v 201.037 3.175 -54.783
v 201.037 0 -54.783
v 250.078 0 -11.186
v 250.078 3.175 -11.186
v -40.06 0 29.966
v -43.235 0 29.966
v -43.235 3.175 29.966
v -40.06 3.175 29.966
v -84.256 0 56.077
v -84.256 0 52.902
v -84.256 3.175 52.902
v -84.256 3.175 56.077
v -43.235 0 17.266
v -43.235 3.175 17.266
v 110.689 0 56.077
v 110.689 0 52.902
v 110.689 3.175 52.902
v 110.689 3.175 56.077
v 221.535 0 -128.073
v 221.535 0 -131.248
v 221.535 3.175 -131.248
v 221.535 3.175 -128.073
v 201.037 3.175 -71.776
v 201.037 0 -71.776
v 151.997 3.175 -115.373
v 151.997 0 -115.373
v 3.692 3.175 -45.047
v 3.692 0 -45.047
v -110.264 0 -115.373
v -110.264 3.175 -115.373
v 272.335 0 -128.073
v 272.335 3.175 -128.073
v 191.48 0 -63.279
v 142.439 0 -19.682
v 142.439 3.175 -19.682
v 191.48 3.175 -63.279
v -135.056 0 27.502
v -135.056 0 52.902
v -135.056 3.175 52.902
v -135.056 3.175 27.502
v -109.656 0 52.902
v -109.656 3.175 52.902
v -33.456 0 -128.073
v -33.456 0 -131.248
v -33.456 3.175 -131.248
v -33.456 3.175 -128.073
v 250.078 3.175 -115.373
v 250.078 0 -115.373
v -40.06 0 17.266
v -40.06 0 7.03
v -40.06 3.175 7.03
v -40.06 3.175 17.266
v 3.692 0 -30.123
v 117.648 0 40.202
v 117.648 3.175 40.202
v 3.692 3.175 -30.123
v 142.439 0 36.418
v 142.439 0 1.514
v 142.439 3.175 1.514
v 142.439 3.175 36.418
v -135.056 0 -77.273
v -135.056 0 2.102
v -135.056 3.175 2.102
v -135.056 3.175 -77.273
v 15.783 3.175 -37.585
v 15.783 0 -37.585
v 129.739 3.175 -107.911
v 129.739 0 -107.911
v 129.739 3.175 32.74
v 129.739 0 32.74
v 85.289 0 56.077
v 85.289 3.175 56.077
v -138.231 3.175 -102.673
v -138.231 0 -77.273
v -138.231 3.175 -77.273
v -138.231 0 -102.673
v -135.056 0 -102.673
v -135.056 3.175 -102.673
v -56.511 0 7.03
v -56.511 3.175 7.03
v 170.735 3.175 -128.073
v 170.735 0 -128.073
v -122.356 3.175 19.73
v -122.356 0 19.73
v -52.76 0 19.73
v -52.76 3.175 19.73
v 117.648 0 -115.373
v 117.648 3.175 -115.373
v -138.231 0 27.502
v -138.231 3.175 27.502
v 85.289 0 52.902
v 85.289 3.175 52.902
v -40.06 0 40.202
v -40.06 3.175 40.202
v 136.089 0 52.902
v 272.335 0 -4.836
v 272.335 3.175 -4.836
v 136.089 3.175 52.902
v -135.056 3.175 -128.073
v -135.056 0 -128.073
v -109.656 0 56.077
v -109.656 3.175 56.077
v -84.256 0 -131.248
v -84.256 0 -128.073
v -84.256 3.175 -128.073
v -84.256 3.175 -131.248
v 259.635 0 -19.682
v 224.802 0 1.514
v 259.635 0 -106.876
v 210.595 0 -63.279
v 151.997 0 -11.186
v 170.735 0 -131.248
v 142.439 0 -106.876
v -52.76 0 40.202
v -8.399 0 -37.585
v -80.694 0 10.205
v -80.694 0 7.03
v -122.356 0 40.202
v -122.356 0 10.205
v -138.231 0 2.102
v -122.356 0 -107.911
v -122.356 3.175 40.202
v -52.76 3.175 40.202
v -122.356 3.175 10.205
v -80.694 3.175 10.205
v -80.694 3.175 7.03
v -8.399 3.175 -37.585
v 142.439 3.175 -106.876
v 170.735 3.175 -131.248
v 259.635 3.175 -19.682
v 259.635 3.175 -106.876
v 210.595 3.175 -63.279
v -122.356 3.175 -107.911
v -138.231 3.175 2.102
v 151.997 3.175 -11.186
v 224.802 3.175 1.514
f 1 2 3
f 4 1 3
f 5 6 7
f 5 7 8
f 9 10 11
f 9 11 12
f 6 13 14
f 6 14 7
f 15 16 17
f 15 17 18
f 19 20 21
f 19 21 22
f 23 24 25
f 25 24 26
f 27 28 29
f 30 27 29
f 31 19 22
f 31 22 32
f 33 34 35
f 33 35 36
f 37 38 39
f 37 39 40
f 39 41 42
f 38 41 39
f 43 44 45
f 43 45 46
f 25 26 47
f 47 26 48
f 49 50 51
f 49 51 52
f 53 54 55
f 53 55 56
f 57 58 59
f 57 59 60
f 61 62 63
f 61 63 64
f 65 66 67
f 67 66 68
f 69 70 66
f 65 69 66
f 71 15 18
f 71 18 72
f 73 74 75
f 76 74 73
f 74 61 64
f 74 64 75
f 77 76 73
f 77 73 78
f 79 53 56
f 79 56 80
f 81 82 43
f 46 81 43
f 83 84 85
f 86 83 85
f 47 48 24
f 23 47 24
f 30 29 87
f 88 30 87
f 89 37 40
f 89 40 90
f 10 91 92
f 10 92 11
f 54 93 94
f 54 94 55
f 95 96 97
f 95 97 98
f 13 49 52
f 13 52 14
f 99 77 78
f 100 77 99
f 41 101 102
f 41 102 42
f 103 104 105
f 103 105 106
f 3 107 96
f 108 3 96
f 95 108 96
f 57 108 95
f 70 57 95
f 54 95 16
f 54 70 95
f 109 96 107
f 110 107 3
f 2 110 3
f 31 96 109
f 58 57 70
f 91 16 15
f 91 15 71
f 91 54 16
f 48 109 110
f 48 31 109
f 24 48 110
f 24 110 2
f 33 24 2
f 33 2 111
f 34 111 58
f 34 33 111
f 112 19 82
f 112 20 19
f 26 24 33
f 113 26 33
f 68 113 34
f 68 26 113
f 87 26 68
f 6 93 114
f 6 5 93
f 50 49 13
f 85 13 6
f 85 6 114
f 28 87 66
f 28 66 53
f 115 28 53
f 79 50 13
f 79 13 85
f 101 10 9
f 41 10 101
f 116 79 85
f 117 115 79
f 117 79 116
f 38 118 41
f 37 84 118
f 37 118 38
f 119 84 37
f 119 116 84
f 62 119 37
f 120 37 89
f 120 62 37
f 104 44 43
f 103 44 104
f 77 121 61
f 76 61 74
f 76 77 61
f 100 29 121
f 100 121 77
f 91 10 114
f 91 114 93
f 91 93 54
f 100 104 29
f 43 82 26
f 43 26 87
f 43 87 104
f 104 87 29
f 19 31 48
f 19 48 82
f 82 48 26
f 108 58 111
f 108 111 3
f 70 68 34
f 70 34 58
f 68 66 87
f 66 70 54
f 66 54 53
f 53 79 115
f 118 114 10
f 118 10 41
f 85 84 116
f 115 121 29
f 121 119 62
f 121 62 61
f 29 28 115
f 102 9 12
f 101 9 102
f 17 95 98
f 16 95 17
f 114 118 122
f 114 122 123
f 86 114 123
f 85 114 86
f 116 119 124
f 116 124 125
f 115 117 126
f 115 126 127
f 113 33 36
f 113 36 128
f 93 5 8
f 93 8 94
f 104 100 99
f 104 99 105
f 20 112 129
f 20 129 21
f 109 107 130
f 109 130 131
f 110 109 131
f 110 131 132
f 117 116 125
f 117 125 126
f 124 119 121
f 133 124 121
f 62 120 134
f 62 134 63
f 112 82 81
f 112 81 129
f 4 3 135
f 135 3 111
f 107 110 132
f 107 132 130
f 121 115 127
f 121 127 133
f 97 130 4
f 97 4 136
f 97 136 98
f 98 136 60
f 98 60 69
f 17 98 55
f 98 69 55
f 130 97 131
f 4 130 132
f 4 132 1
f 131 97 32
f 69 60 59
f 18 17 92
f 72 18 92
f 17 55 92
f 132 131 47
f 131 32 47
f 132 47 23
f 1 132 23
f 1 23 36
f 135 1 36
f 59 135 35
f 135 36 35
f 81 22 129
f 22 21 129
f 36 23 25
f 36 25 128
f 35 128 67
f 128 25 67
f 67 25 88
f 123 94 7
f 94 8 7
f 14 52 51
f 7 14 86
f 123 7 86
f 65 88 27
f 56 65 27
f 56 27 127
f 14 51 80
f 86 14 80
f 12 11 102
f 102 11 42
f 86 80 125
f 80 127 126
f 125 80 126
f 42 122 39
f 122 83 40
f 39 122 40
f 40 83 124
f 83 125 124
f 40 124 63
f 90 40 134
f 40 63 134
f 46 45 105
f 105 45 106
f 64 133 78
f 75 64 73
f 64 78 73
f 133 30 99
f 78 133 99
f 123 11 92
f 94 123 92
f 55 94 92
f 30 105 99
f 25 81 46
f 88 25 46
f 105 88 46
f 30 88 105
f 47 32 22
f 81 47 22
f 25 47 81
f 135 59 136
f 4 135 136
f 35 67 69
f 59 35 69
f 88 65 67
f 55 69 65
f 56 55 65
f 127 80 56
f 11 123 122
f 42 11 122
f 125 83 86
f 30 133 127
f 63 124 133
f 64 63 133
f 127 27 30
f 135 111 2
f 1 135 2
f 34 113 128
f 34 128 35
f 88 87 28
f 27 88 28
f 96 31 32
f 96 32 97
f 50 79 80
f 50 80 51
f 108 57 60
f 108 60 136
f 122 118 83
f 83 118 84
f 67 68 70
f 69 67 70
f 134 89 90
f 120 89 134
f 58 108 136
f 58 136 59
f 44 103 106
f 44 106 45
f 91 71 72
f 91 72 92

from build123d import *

# Parameters (mm, degrees)
SKETCH1_W           = 69.596
SKETCH1_H           = 20.4724
BOSS_EXTRUDE1_DEPTH = 3.175


with BuildPart() as part:
    # Sketch1 → Boss-Extrude1 (new body)
    with BuildSketch(Plane(origin=(0, 0, 0), x_dir=(1, 0, 0), z_dir=(0, 1, 0))):
        Polygon((272.33503015, 4.835931583), (136.08943015, -52.902160647), (110.68943015, -52.902160647), (110.68943015, -56.077160647), (85.28943015, -56.077160647), (85.28943015, -52.902160647), (-84.25556985, -52.902160647), (-84.25556985, -56.077160647), (-109.65556985, -56.077160647), (-109.65556985, -52.902160647), (-135.05556985, -52.902160647), (-135.05556985, -27.502160647), (-138.23056985, -27.502160647), (-138.23056985, -2.102160647), (-135.05556985, -2.102160647), (-135.05556985, 77.272839353), (-138.23056985, 77.272839353), (-138.23056985, 102.672839353), (-135.05556985, 102.672839353), (-135.05556985, 128.072839353), (-84.25556985, 128.072839353), (-84.25556985, 131.247839353), (-33.45556985, 131.247839353), (-33.45556985, 128.072839353), (136.08943015, 128.072839353), (170.73503015, 128.072839353), (170.73503015, 131.247839353), (221.53503015, 131.247839353), (221.53503015, 128.072839353), (272.33503015, 128.072839353), align=None)
        Polygon((201.03723015, 54.782902056), (250.077682757, 11.185931583), (151.996777543, 11.185931583), align=None, mode=Mode.SUBTRACT)
        Polygon((-56.511497321, -7.029760647), (-40.05956985, -7.029760647), (-40.05956985, -17.265960647), (-43.23456985, -17.265960647), (-43.23456985, -29.965960647), (-40.05956985, -29.965960647), (-40.05956985, -40.202160647), (117.648185377, -40.202160647), (3.69193015, 30.123488044), align=None, mode=Mode.SUBTRACT)
        Polygon((210.594577543, 63.279385468), (259.63503015, 19.682414995), (259.63503015, 106.87635594), align=None, mode=Mode.SUBTRACT)
        Polygon((142.43943015, -1.514068417), (142.43943015, -36.417831993), (224.802459945, -1.514068417), align=None, mode=Mode.SUBTRACT)
        Polygon((151.996777543, 115.372839353), (250.077682757, 115.372839353), (201.03723015, 71.77586888), align=None, mode=Mode.SUBTRACT)
        Polygon((142.43943015, 106.87635594), (142.43943015, 19.682414995), (191.479882757, 63.279385468), align=None, mode=Mode.SUBTRACT)
        Polygon((-110.264325076, 115.372839353), (117.648185377, 115.372839353), (3.69193015, 45.047190661), align=None, mode=Mode.SUBTRACT)
        Polygon((-122.35556985, 107.910988044), (-122.35556985, -7.029760647), (-122.35556985, -10.204760647), (-80.693986868, -10.204760647), (-80.693986868, -7.029760647), (-8.399314623, 37.585339353), align=None, mode=Mode.SUBTRACT)
        Polygon((129.73943015, 107.910988044), (129.73943015, -32.740309339), (15.783174924, 37.585339353), align=None, mode=Mode.SUBTRACT)
        with Locations((-87.55756985, -29.965960647)):
            Rectangle(SKETCH1_W, SKETCH1_H, mode=Mode.SUBTRACT)
    extrude(amount=BOSS_EXTRUDE1_DEPTH)


solid = part.part
